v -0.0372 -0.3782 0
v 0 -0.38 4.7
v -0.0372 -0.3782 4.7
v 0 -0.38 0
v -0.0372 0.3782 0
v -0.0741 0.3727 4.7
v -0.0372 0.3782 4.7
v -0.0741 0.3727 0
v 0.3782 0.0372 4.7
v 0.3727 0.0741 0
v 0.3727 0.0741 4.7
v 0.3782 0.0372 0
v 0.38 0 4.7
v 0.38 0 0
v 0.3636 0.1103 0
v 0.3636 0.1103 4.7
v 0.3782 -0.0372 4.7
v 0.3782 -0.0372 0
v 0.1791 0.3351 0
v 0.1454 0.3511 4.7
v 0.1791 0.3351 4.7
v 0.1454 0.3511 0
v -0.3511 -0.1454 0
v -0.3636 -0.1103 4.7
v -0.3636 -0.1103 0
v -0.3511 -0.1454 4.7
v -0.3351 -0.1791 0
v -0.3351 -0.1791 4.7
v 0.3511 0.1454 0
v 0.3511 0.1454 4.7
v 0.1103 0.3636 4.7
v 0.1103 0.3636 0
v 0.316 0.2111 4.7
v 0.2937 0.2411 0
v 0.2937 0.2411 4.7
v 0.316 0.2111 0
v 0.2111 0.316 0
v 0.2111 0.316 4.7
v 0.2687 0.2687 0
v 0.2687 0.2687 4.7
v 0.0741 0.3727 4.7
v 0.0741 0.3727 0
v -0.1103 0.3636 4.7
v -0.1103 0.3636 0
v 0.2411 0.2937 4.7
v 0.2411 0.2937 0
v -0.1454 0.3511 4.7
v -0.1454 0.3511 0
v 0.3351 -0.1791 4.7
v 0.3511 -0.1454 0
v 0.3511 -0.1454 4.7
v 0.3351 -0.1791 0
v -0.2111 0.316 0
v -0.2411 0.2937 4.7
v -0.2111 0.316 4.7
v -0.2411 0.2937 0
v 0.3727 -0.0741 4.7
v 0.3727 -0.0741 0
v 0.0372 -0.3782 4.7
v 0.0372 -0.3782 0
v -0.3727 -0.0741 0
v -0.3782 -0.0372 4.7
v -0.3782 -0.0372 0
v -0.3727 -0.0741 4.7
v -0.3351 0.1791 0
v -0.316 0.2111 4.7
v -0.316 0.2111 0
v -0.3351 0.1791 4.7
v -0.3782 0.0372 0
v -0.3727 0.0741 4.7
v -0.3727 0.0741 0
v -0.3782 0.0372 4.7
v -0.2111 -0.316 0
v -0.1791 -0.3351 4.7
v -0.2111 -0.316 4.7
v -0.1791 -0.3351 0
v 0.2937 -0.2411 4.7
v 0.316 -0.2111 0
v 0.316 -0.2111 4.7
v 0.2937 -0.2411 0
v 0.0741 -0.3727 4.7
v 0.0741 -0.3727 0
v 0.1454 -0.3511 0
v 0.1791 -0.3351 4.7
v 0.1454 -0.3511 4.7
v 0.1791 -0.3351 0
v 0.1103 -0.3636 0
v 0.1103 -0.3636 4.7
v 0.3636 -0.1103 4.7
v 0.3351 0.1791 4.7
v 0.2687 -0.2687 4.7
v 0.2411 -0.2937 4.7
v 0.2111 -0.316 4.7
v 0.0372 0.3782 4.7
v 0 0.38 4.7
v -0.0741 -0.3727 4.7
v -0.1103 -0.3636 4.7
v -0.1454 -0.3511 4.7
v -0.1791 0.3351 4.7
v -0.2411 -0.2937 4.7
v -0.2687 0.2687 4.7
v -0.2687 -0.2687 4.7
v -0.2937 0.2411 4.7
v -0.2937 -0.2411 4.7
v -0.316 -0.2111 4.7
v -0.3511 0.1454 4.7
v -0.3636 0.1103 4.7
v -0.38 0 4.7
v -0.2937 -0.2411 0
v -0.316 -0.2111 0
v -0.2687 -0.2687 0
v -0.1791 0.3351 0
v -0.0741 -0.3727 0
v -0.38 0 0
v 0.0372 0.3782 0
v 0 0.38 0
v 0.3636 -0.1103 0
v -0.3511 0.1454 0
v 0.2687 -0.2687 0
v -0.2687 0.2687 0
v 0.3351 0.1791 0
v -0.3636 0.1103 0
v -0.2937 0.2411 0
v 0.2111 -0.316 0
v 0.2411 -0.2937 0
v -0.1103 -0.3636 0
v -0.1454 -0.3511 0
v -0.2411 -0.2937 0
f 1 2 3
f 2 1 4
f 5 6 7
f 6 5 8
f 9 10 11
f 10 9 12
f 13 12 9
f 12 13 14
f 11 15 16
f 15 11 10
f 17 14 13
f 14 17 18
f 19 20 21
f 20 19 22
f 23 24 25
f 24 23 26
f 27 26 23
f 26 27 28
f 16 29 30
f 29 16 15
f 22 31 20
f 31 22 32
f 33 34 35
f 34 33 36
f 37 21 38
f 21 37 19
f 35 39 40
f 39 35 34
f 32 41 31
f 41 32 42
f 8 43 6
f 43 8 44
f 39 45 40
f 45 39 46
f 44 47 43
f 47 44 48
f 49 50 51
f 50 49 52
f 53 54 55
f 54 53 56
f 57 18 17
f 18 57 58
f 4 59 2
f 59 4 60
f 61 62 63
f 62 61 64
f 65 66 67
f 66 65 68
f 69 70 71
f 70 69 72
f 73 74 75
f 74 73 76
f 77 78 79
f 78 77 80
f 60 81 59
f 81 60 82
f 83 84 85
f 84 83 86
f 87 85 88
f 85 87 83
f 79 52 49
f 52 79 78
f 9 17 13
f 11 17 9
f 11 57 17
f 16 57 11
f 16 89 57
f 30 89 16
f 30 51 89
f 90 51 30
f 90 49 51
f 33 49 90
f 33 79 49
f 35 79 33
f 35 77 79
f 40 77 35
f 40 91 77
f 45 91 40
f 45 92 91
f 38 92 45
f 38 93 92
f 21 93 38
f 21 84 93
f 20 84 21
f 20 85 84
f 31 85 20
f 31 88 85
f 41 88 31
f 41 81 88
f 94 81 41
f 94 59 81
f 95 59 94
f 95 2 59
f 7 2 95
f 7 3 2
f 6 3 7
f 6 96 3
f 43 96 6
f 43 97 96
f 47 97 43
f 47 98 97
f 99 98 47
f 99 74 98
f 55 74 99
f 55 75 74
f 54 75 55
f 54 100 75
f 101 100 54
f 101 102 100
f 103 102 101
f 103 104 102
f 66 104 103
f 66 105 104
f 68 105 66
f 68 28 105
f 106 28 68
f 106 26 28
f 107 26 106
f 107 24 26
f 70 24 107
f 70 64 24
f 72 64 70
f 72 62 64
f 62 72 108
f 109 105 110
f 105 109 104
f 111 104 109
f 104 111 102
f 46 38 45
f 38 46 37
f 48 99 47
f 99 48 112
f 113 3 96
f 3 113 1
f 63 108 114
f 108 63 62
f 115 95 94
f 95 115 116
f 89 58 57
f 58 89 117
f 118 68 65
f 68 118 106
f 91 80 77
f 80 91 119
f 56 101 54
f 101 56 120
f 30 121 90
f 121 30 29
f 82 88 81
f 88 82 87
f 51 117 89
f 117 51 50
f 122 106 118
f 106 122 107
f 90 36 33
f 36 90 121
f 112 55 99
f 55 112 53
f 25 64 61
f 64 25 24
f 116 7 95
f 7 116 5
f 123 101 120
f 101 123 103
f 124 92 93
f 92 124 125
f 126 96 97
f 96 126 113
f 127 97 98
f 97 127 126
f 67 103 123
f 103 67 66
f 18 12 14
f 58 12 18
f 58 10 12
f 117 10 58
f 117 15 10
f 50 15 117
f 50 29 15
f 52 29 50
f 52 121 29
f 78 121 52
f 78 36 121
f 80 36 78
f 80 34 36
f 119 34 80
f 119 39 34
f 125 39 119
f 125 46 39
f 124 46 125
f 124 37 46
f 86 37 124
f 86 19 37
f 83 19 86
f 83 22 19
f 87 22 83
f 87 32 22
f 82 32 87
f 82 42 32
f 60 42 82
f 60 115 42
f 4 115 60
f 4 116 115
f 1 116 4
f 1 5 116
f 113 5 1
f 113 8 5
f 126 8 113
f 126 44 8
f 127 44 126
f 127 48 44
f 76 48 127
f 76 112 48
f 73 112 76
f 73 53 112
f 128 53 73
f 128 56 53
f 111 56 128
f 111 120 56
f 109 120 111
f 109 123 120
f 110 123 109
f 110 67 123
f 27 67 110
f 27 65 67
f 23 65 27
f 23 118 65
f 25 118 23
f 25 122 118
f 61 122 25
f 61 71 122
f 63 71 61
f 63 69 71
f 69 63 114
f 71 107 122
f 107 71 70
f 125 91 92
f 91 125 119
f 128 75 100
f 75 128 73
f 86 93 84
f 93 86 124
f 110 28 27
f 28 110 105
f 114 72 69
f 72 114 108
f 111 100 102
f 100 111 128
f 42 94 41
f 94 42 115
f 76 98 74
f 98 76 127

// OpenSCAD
module toggle_switch() {
    difference() {
        union() {
            // Main body of the toggle switch
            cylinder(h=4.7, d=0.76, $fn=64);
            // Top part of the toggle switch
            translate([0, 0, 4.7])
                sphere(d=0.76, $fn=64);
        }
        // Remove the bottom half of the sphere to make it a dome
        translate([0, 0, 4.7])
            cylinder(h=0.38, d=0.76, $fn=64);
    }
}

toggle_switch();
